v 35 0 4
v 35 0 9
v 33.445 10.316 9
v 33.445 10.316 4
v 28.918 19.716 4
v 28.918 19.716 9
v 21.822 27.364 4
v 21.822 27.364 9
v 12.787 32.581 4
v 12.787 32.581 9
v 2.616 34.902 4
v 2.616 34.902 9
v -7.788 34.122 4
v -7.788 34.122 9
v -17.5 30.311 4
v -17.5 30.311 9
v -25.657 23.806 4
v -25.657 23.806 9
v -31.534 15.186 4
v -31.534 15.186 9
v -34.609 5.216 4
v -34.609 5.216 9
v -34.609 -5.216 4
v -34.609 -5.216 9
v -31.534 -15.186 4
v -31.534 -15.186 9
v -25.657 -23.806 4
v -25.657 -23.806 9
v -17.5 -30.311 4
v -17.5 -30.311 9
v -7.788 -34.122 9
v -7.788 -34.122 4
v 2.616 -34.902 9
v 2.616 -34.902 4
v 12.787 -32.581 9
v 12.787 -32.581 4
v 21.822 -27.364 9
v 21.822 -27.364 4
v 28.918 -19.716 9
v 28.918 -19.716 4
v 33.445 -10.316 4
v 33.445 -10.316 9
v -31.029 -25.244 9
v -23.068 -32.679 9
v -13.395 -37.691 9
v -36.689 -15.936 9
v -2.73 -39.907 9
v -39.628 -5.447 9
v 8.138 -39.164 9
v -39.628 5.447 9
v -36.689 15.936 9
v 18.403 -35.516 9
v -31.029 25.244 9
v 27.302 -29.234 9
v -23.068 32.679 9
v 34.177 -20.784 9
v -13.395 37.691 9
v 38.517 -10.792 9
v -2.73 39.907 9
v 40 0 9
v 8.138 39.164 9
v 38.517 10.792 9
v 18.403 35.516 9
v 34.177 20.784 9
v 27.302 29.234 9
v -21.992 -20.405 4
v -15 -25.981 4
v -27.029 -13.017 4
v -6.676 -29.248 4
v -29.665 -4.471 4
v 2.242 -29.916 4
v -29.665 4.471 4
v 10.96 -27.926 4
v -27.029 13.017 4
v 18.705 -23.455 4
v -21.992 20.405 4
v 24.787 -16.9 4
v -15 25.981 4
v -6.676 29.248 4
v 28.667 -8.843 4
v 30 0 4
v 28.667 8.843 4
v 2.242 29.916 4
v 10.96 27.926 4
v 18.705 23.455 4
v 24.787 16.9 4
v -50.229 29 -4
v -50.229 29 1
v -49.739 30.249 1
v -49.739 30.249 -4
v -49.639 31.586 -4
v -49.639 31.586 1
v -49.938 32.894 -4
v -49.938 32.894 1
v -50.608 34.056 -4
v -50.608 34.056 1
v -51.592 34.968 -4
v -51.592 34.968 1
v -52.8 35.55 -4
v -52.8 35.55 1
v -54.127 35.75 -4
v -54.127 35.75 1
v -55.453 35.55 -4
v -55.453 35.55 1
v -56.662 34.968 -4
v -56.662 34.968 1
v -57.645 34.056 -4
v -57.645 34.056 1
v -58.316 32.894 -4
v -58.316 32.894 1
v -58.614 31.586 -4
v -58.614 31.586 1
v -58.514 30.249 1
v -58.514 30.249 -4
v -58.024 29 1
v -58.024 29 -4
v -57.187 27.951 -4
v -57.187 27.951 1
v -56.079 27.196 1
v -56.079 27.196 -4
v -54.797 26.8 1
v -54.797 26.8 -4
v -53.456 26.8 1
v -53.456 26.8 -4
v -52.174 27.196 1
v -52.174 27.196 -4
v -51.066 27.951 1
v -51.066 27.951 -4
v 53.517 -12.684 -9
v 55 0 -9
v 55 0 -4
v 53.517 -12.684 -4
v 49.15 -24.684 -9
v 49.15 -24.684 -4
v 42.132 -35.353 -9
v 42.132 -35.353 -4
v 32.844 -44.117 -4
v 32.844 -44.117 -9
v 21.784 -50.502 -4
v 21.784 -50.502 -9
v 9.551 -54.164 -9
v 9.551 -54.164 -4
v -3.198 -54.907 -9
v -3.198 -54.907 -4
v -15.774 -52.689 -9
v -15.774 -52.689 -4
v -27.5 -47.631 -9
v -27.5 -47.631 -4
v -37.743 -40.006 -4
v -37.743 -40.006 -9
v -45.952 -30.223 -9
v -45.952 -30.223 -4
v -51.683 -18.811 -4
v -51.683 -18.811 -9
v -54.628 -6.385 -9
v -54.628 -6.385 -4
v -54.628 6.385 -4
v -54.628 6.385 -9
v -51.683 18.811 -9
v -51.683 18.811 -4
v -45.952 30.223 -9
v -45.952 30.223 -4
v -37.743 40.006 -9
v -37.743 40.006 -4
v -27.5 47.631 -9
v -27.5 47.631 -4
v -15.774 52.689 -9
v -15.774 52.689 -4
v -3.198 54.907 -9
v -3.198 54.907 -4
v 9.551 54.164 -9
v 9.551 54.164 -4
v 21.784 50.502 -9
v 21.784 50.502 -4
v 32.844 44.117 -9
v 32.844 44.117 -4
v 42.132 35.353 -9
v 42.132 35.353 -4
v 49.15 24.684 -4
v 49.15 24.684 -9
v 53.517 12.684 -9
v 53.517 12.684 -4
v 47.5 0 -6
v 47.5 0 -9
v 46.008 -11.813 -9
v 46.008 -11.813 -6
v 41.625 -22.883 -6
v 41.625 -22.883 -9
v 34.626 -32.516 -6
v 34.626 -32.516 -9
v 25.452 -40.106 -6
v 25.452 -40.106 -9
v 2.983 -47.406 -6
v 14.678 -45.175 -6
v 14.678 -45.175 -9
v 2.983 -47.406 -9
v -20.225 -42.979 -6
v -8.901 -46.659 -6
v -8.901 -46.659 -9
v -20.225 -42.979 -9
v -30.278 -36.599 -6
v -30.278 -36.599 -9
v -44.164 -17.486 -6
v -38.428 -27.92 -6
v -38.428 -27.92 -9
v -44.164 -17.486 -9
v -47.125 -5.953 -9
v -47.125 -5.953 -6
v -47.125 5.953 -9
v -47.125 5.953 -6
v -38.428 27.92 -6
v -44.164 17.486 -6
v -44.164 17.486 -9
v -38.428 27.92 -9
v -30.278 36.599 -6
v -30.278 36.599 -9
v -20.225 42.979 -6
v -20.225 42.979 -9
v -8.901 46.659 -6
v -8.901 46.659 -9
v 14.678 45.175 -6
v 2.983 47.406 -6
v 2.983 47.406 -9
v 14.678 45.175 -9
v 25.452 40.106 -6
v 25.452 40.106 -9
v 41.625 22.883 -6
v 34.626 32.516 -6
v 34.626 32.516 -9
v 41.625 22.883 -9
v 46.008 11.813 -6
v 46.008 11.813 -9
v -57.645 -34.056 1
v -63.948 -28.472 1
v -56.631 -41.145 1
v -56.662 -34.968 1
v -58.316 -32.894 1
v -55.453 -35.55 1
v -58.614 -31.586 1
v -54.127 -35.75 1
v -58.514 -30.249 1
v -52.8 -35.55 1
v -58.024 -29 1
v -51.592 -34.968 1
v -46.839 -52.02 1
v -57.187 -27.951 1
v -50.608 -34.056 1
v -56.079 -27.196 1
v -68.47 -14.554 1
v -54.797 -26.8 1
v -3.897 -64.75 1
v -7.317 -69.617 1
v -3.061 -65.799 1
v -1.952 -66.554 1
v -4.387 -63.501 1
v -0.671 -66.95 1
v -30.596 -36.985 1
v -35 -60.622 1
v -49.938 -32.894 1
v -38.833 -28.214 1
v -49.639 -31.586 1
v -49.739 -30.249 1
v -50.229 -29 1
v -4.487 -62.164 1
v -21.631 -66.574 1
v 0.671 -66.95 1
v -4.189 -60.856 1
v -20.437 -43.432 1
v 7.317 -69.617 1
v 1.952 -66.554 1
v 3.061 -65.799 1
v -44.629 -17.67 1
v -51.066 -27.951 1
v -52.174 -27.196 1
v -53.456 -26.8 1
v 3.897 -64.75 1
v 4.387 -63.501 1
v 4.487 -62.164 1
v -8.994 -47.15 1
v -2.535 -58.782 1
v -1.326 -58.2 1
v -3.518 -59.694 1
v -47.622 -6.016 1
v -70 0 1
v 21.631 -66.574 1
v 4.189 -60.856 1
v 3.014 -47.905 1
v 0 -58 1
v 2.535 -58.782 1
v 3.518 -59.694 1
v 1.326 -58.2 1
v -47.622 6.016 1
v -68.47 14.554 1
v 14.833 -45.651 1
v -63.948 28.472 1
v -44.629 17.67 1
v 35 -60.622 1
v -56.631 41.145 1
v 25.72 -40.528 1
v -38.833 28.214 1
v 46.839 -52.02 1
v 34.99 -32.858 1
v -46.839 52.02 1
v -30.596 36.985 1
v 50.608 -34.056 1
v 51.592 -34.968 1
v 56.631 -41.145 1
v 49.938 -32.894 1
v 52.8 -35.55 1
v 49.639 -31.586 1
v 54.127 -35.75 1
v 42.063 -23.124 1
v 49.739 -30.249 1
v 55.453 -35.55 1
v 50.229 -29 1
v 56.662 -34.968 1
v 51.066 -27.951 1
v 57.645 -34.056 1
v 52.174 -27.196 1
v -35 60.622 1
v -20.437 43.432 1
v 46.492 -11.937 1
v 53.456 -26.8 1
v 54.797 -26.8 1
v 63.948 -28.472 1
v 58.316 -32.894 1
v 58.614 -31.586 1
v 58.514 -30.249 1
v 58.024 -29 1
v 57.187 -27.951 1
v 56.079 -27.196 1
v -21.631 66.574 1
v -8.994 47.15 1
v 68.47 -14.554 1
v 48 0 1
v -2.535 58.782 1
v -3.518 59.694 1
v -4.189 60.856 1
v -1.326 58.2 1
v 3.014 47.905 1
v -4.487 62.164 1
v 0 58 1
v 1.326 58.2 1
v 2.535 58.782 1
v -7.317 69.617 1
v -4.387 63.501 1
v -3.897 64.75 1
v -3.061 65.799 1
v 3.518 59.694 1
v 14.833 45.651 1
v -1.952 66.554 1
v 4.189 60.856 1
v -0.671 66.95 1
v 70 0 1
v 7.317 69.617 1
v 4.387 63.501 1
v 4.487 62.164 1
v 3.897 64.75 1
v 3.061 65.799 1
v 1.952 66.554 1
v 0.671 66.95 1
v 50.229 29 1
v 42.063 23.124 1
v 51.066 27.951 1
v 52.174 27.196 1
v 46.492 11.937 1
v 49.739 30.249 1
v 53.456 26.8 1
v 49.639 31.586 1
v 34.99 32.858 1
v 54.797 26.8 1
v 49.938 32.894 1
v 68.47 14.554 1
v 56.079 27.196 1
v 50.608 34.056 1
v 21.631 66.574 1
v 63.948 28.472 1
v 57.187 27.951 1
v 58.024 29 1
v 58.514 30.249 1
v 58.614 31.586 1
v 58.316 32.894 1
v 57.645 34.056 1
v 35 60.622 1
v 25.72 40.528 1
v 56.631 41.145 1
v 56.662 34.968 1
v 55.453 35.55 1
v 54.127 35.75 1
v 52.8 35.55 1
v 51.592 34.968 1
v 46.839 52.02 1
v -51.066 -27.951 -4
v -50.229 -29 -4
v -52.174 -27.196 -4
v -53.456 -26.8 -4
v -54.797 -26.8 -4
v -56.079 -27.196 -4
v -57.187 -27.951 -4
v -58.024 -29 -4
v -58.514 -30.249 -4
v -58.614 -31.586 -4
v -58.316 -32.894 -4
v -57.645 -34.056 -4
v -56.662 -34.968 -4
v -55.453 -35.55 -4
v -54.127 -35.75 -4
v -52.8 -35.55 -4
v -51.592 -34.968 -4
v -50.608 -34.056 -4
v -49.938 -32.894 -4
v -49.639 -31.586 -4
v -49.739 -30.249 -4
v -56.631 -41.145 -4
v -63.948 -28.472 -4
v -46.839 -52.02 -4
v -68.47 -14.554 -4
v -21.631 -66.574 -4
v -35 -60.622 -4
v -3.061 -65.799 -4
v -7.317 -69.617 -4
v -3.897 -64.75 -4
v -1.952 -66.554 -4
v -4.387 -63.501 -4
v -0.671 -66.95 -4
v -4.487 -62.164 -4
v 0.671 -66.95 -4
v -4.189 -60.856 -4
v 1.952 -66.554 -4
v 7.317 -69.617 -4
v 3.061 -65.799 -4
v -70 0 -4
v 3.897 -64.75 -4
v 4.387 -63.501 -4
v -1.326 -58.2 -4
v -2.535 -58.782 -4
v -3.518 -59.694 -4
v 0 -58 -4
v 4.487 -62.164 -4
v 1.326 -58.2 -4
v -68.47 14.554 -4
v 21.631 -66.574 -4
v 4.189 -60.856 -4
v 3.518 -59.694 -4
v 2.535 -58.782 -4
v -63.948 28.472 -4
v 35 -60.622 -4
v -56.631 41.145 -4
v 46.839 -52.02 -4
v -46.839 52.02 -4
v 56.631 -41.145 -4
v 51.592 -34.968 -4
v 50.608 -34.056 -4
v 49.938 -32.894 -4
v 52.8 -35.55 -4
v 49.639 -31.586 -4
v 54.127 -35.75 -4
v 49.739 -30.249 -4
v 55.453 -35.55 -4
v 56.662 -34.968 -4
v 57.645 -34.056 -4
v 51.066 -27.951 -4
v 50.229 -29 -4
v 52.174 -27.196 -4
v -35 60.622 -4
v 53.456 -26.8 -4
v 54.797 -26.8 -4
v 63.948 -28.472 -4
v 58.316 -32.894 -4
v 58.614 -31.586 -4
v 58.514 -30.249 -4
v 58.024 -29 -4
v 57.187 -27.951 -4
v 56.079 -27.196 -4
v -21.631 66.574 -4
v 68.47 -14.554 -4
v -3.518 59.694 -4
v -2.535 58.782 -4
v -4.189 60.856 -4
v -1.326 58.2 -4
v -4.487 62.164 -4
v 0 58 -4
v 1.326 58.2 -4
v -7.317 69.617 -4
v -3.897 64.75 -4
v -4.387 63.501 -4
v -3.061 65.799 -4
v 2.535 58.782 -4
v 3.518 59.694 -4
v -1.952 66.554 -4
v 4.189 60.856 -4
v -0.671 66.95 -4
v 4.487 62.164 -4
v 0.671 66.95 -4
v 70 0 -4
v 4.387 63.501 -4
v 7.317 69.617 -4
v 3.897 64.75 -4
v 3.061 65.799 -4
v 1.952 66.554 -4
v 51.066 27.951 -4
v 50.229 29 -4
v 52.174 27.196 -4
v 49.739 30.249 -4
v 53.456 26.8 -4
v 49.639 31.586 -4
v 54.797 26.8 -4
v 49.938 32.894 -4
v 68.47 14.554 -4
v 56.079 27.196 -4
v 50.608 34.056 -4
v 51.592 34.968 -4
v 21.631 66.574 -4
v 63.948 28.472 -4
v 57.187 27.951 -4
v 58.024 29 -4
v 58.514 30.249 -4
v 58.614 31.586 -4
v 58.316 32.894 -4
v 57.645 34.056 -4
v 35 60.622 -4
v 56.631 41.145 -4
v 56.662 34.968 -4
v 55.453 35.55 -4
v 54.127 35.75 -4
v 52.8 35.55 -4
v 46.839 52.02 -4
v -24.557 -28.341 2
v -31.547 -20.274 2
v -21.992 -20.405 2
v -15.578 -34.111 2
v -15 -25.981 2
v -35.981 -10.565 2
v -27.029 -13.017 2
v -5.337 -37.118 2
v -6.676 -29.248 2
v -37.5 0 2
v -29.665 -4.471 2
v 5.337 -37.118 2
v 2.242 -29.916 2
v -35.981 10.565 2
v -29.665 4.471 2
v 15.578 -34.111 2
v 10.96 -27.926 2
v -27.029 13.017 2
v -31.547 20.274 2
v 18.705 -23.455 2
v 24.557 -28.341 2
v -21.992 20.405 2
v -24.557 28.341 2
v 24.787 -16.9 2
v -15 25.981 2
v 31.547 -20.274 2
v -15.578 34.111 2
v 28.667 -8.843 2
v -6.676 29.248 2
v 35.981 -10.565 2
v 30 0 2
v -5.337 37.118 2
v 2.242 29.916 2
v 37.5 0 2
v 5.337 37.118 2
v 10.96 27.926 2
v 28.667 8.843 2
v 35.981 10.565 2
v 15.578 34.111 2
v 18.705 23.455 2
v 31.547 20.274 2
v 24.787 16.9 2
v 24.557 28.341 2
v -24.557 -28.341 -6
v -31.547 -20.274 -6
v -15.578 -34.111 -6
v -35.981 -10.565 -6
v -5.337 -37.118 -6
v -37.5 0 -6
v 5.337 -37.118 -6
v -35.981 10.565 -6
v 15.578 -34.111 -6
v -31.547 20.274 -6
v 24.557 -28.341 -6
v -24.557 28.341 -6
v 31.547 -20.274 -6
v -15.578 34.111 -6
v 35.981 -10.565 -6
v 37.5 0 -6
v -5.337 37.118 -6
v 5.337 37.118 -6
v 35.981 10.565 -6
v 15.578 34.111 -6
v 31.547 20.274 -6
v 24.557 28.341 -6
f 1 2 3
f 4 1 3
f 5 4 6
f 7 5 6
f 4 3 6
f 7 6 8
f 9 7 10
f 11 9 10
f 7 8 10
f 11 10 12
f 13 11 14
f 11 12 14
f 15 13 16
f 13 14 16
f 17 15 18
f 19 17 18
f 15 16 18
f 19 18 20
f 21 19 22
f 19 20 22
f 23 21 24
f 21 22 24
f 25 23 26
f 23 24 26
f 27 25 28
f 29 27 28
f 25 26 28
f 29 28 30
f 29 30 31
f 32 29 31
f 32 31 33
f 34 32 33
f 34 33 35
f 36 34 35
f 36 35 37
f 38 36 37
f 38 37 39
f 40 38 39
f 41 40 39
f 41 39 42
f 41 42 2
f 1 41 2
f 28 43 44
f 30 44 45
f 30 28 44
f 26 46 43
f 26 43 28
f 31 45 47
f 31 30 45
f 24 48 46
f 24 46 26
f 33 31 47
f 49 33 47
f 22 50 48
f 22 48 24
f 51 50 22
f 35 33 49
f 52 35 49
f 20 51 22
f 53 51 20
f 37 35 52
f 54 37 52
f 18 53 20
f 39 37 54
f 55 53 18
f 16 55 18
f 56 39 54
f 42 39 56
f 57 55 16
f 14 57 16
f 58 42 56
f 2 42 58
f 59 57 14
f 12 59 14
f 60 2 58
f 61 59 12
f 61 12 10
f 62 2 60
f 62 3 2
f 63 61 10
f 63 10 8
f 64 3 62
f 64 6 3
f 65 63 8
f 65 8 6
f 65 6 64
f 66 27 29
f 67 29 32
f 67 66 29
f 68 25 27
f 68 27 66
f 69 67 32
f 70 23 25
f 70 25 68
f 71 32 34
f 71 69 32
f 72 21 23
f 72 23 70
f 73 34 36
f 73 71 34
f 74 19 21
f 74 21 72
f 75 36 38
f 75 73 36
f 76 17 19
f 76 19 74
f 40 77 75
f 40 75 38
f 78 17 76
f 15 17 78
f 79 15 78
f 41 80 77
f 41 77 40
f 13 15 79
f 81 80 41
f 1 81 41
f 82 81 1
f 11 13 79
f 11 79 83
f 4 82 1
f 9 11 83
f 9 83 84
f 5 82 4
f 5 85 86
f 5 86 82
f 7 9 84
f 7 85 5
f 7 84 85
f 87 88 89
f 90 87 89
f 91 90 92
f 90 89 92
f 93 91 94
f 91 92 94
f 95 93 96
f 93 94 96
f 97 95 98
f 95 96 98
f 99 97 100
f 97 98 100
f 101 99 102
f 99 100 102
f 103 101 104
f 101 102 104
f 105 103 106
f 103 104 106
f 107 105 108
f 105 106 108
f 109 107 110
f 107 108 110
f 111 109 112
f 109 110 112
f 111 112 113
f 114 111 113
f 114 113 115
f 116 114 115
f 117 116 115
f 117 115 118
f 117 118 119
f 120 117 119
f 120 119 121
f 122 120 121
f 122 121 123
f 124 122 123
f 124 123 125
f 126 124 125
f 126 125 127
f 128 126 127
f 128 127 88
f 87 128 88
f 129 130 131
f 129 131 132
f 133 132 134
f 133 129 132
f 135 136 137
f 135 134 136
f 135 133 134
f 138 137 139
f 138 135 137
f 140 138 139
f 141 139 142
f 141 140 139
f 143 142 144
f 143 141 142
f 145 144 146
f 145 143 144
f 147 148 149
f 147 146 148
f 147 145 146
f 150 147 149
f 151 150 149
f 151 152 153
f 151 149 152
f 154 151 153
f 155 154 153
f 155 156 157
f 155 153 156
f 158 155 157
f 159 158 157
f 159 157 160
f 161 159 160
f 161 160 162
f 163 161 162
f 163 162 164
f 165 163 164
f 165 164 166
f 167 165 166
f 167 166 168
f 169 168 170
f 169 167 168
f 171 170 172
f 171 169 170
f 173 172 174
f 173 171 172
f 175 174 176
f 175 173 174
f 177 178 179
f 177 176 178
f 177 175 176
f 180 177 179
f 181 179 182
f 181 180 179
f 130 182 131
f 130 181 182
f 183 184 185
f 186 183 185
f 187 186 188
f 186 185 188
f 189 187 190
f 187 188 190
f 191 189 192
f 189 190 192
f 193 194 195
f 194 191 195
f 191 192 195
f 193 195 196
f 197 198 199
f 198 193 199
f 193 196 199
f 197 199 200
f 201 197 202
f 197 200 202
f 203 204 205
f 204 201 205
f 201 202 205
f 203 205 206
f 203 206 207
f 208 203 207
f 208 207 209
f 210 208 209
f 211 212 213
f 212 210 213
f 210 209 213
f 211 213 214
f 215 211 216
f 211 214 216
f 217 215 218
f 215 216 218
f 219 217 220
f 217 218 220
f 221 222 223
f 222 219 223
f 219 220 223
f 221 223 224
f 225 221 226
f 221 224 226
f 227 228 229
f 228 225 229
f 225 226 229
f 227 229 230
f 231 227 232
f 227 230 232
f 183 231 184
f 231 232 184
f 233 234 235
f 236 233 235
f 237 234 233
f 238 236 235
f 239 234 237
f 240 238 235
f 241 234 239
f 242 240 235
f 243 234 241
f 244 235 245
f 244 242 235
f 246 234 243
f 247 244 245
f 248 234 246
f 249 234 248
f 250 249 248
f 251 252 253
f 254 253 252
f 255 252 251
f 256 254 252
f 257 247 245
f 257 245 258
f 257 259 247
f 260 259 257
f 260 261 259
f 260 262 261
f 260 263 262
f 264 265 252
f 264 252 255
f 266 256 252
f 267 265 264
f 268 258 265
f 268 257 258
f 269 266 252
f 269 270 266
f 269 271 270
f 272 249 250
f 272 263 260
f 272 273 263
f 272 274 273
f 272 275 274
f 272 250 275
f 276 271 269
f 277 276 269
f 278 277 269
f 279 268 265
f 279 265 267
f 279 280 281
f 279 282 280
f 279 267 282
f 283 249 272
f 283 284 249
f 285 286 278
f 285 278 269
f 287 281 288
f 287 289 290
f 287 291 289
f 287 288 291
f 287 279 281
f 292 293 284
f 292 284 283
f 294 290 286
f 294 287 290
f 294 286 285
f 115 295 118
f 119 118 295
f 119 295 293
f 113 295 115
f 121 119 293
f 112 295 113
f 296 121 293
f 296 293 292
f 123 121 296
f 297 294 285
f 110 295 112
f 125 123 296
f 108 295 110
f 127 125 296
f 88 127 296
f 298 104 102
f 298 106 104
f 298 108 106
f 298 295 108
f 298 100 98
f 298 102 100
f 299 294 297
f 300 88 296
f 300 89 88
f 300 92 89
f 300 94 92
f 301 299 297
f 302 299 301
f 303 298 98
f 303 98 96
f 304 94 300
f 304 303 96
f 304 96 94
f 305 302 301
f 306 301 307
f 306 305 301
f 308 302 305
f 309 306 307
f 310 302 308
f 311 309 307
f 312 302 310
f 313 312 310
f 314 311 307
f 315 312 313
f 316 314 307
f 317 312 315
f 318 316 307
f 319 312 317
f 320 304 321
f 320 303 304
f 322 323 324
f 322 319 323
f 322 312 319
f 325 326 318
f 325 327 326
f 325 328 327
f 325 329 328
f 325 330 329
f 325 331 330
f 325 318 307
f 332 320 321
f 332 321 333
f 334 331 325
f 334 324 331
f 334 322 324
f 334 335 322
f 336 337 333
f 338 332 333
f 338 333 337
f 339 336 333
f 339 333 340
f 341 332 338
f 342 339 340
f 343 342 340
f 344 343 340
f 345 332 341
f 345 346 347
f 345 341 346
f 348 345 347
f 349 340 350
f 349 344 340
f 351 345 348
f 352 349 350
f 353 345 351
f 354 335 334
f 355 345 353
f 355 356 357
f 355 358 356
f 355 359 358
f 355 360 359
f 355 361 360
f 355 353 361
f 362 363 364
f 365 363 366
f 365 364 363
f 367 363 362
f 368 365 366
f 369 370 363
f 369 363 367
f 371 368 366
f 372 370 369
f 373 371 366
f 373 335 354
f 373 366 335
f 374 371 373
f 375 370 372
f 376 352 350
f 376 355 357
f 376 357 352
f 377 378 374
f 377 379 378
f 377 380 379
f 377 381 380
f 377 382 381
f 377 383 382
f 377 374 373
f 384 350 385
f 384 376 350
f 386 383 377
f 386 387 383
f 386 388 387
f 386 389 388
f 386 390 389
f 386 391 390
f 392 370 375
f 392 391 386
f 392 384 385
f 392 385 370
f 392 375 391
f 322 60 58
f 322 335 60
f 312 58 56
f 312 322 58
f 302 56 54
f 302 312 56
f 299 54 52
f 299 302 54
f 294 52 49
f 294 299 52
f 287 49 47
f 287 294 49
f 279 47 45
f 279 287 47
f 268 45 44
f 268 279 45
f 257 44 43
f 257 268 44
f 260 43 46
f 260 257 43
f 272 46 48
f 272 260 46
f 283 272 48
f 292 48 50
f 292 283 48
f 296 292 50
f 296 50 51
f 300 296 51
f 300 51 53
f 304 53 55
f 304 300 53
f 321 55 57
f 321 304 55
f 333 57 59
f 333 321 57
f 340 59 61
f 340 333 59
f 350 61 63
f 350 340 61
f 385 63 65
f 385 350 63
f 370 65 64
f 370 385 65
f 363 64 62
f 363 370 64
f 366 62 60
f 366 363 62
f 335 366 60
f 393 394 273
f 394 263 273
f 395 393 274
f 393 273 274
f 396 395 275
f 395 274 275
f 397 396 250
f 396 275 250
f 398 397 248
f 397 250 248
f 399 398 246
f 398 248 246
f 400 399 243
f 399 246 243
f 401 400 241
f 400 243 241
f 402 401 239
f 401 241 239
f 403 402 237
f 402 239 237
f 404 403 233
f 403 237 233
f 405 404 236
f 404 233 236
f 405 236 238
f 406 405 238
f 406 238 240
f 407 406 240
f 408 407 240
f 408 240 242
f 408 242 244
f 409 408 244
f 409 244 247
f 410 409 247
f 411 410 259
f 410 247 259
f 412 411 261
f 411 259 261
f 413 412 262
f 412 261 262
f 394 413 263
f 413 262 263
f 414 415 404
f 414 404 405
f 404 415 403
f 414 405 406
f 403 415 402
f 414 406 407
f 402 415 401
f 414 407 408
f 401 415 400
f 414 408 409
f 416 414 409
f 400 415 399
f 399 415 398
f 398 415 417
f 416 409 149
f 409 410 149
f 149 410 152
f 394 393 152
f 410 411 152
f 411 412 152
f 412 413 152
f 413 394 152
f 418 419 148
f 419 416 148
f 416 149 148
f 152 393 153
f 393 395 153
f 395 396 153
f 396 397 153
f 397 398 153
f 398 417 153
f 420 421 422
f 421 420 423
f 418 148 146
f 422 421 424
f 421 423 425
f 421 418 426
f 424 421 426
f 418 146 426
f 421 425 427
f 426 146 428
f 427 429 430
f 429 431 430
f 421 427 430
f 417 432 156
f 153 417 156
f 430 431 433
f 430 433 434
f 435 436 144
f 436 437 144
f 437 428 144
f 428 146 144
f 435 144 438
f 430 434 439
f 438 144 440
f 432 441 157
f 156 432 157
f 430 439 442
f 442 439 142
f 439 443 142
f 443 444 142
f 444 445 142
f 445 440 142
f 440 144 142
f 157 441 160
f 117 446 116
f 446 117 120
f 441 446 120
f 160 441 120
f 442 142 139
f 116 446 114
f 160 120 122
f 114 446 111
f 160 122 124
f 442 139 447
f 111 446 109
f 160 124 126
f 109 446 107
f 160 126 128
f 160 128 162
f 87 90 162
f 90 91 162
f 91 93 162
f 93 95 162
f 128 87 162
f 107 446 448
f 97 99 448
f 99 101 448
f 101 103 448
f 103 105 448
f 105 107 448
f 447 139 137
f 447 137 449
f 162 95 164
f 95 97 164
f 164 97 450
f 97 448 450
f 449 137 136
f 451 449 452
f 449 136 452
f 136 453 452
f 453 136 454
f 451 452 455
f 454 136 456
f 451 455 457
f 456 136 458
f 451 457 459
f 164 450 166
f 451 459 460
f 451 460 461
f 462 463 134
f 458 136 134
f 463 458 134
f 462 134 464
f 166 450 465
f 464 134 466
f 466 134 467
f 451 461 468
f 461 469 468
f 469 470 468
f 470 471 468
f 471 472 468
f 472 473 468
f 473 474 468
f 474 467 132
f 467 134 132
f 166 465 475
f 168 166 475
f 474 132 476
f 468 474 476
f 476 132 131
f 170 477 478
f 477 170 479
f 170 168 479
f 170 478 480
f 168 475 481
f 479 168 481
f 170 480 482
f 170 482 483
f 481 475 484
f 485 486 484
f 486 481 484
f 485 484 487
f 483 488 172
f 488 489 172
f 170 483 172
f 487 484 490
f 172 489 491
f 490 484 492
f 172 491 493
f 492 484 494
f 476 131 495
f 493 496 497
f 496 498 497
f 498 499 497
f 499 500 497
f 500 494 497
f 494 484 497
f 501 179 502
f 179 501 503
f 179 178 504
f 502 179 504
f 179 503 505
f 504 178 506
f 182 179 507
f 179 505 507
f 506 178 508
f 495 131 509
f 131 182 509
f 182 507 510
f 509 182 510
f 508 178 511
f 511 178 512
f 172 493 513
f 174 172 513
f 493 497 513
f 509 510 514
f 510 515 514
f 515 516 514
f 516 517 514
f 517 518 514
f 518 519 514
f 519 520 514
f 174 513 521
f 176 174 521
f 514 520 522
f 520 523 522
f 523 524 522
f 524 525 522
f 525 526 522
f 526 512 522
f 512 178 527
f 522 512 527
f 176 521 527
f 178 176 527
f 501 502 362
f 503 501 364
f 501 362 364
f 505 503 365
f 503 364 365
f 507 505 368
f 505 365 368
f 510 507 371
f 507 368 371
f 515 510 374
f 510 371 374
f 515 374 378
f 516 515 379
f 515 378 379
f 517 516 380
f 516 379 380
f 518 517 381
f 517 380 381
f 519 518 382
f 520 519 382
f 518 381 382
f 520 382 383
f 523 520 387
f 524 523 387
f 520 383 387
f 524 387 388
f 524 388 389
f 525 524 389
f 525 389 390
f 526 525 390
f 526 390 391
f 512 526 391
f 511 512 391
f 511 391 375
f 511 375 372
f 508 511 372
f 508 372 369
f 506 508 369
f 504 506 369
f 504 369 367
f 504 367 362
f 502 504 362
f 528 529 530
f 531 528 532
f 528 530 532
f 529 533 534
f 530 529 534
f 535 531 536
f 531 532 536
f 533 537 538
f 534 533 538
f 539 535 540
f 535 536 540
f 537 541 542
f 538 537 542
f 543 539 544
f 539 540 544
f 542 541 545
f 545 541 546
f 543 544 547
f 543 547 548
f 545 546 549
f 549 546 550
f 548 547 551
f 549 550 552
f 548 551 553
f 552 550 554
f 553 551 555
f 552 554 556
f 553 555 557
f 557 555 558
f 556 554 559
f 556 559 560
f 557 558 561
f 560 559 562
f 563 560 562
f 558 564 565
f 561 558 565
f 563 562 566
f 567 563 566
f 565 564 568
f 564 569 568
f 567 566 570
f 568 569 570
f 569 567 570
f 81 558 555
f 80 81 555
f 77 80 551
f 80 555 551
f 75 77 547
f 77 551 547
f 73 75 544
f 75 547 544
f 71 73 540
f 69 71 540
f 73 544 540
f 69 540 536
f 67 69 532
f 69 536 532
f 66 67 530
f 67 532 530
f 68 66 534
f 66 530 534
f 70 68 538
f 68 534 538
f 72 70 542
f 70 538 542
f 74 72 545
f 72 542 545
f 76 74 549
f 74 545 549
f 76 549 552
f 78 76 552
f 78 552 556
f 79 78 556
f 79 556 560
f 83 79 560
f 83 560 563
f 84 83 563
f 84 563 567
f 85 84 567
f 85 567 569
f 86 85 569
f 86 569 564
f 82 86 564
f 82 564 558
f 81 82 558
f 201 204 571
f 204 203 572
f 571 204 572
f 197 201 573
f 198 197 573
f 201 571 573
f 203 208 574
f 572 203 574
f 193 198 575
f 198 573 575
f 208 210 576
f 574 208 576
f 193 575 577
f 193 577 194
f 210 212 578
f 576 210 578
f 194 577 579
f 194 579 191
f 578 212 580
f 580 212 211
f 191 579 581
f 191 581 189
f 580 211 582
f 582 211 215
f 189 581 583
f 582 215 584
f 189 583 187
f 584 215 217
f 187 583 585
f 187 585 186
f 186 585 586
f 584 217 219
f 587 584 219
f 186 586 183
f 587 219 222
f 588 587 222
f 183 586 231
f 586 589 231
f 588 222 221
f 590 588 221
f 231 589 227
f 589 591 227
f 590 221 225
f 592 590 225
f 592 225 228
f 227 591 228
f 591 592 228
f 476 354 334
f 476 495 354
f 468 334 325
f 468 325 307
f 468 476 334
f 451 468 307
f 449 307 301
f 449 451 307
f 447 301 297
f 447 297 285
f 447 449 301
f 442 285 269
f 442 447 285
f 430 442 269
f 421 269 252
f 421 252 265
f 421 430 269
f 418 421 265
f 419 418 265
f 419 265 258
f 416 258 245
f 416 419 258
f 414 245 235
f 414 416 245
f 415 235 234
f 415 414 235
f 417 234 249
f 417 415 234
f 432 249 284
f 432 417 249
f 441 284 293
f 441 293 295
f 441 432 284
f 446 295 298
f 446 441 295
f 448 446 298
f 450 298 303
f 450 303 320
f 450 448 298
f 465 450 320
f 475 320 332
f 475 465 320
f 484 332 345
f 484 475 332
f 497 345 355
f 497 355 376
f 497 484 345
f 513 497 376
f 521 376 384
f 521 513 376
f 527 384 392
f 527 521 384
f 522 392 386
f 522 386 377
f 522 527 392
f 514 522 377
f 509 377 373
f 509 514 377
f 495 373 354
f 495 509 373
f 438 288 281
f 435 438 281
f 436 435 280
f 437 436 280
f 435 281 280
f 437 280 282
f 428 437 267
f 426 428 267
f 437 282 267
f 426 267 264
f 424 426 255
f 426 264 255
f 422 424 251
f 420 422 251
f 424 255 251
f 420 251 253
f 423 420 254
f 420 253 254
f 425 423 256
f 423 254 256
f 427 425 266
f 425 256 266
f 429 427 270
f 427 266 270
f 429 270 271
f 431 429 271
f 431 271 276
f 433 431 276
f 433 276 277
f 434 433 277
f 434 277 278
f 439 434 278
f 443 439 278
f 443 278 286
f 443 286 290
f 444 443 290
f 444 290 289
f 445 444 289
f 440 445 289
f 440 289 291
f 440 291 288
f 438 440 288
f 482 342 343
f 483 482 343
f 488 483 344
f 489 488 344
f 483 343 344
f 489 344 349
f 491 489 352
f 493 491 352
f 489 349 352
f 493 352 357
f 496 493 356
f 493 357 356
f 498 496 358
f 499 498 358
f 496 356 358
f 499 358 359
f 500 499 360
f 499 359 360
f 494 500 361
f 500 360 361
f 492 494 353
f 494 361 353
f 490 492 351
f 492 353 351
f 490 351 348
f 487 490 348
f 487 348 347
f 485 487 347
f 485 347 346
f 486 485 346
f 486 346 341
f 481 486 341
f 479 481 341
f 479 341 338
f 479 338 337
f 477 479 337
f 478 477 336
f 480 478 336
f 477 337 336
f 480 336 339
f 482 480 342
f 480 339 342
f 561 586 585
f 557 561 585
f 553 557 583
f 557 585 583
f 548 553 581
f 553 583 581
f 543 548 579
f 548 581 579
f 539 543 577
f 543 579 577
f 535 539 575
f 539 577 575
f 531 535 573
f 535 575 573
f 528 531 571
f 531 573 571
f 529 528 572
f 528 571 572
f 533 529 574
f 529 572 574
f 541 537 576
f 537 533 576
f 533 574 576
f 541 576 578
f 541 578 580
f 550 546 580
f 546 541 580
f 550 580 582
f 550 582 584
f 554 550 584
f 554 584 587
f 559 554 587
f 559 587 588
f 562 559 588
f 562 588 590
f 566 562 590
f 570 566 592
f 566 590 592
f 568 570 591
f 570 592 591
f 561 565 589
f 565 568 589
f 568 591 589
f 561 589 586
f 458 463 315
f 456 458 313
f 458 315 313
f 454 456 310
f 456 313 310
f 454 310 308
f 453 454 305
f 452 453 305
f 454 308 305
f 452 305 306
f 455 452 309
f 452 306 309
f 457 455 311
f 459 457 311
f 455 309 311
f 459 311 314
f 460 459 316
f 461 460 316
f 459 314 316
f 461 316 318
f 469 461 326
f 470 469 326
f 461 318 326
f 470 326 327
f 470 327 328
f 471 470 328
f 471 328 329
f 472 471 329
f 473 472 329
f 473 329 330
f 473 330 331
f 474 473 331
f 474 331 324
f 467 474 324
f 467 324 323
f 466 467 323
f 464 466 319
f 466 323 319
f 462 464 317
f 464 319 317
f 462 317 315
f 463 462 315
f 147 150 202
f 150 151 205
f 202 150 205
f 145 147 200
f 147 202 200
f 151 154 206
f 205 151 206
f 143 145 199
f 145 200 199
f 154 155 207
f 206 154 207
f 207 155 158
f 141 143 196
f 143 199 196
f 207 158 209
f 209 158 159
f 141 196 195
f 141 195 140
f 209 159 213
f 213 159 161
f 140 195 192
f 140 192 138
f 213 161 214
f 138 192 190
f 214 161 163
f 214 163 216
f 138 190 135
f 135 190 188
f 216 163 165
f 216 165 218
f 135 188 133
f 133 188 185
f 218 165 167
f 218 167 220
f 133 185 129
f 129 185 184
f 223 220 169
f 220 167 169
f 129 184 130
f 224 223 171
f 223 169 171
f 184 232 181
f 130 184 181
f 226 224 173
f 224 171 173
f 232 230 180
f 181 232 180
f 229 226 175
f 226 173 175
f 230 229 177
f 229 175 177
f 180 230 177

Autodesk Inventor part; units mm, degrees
ref_plane "YZ Plane" through (0, 0, 0) normal (1, 0, 0) x (0, 1, 0)
ref_plane "XZ Plane" through (0, 0, 0) normal (0, 1, 0) x (-1, 0, 0)
ref_plane "XY Plane" through (0, 0, 0) normal (0, 0, 1) x (1, 0, 0)
sketch "Sketch1" plane through (-195.9052, -159.4976, -9) normal (0, 0, 1) x (1, 0, 0)
  circle A0 centre (195.9052, 159.4976) radius 70
  dimension "d29" = 140
extrude "ExtrusionBlind1" add sketch "Sketch1" along normal blind 18
sketch "Sketch2" plane through (-195.9052, -159.4976, -9) normal (0, 0, 1) x (1, 0, 0)
  circle A0 centre (195.9052, 159.4976) radius 55
  circle A1 centre (195.9052, 159.4976) radius 83.1126
  circle A2 centre (195.9052, 159.4976) radius 70 projected
  dimension "d30" = 166.2252
  dimension "d31" = 110
extrude "ExtrusionBlind2" cut sketch "Sketch2" along normal blind 5 contours A1 | A2
sketch "Sketch3" plane through (-195.9052, -159.4976, -9) normal (0, 0, 1) x (1, 0, 0)
  circle A0 centre (195.9052, 159.4976) radius 30
  circle A1 centre (195.9052, 159.4976) radius 55 projected
  dimension "d32" = 60
extrude "ExtrusionThru1" cut sketch "Sketch3" along normal through all contours A0
sketch "Sketch4" plane through (-195.9052, -159.4976, -9) normal (0, 0, 1) x (1, 0, 0)
  circle A0 centre (195.9052, 159.4976) radius 37.5
  circle A1 centre (195.9052, 159.4976) radius 55 projected
  dimension "d33" = 75
extrude "ExtrusionBlind3" cut sketch "Sketch4" along normal blind 11 contours A0
sketch "Sketch5" plane through (-195.9052, -159.4976, -9) normal (0, 0, 1) x (1, 0, 0)
  circle A0 centre (195.9052, 159.4976) radius 47.5
  circle A1 centre (195.9052, 159.4976) radius 55 projected
  dimension "d34" = 95
extrude "ExtrusionBlind4" cut sketch "Sketch5" along normal blind 3 contours A0
sketch "Sketch6" plane through (0, 0, -4) normal (0, 0, -1) x (-1, 0, 0)
  point P0 (0, -62.5)
hole "Hole1" at (0, -62.5, -4) direction (0, 0, 1) diameter 9 end through all
pattern_circular "PolarArray1" count 6 over 360 about axis through (0, 0, -9) along (0, 0, -1) of "Hole1"
sketch "Sketch9" plane through (0, 0, 9) normal (0, 0, 1) x (1, 0, 0)
  circle A0 centre (0, 0) radius 35
  circle A1 centre (0, 0) radius 47.5 projected
  dimension "d35" = 70
extrude "ExtrusionBlind5" cut sketch "Sketch9" against normal blind 5 contours A0
sketch "Sketch10" plane through (0, 0, 9) normal (0, 0, 1) x (1, 0, 0)
  circle A0 centre (0, 0) radius 48
  circle A1 centre (0, 0) radius 87.5498
  circle A2 centre (0, 0) radius 55 projected
  dimension "d36" = 175.0996
  dimension "d37" = 96
extrude "ExtrusionBlind6" cut sketch "Sketch10" against normal blind 8 contours A1 | A2
chamfer "Chamfer1" distance 8 angle 45 1 edges at (-48, 0, 9)
properties part number "7055-192 PART1" material "Steel, Mild"
